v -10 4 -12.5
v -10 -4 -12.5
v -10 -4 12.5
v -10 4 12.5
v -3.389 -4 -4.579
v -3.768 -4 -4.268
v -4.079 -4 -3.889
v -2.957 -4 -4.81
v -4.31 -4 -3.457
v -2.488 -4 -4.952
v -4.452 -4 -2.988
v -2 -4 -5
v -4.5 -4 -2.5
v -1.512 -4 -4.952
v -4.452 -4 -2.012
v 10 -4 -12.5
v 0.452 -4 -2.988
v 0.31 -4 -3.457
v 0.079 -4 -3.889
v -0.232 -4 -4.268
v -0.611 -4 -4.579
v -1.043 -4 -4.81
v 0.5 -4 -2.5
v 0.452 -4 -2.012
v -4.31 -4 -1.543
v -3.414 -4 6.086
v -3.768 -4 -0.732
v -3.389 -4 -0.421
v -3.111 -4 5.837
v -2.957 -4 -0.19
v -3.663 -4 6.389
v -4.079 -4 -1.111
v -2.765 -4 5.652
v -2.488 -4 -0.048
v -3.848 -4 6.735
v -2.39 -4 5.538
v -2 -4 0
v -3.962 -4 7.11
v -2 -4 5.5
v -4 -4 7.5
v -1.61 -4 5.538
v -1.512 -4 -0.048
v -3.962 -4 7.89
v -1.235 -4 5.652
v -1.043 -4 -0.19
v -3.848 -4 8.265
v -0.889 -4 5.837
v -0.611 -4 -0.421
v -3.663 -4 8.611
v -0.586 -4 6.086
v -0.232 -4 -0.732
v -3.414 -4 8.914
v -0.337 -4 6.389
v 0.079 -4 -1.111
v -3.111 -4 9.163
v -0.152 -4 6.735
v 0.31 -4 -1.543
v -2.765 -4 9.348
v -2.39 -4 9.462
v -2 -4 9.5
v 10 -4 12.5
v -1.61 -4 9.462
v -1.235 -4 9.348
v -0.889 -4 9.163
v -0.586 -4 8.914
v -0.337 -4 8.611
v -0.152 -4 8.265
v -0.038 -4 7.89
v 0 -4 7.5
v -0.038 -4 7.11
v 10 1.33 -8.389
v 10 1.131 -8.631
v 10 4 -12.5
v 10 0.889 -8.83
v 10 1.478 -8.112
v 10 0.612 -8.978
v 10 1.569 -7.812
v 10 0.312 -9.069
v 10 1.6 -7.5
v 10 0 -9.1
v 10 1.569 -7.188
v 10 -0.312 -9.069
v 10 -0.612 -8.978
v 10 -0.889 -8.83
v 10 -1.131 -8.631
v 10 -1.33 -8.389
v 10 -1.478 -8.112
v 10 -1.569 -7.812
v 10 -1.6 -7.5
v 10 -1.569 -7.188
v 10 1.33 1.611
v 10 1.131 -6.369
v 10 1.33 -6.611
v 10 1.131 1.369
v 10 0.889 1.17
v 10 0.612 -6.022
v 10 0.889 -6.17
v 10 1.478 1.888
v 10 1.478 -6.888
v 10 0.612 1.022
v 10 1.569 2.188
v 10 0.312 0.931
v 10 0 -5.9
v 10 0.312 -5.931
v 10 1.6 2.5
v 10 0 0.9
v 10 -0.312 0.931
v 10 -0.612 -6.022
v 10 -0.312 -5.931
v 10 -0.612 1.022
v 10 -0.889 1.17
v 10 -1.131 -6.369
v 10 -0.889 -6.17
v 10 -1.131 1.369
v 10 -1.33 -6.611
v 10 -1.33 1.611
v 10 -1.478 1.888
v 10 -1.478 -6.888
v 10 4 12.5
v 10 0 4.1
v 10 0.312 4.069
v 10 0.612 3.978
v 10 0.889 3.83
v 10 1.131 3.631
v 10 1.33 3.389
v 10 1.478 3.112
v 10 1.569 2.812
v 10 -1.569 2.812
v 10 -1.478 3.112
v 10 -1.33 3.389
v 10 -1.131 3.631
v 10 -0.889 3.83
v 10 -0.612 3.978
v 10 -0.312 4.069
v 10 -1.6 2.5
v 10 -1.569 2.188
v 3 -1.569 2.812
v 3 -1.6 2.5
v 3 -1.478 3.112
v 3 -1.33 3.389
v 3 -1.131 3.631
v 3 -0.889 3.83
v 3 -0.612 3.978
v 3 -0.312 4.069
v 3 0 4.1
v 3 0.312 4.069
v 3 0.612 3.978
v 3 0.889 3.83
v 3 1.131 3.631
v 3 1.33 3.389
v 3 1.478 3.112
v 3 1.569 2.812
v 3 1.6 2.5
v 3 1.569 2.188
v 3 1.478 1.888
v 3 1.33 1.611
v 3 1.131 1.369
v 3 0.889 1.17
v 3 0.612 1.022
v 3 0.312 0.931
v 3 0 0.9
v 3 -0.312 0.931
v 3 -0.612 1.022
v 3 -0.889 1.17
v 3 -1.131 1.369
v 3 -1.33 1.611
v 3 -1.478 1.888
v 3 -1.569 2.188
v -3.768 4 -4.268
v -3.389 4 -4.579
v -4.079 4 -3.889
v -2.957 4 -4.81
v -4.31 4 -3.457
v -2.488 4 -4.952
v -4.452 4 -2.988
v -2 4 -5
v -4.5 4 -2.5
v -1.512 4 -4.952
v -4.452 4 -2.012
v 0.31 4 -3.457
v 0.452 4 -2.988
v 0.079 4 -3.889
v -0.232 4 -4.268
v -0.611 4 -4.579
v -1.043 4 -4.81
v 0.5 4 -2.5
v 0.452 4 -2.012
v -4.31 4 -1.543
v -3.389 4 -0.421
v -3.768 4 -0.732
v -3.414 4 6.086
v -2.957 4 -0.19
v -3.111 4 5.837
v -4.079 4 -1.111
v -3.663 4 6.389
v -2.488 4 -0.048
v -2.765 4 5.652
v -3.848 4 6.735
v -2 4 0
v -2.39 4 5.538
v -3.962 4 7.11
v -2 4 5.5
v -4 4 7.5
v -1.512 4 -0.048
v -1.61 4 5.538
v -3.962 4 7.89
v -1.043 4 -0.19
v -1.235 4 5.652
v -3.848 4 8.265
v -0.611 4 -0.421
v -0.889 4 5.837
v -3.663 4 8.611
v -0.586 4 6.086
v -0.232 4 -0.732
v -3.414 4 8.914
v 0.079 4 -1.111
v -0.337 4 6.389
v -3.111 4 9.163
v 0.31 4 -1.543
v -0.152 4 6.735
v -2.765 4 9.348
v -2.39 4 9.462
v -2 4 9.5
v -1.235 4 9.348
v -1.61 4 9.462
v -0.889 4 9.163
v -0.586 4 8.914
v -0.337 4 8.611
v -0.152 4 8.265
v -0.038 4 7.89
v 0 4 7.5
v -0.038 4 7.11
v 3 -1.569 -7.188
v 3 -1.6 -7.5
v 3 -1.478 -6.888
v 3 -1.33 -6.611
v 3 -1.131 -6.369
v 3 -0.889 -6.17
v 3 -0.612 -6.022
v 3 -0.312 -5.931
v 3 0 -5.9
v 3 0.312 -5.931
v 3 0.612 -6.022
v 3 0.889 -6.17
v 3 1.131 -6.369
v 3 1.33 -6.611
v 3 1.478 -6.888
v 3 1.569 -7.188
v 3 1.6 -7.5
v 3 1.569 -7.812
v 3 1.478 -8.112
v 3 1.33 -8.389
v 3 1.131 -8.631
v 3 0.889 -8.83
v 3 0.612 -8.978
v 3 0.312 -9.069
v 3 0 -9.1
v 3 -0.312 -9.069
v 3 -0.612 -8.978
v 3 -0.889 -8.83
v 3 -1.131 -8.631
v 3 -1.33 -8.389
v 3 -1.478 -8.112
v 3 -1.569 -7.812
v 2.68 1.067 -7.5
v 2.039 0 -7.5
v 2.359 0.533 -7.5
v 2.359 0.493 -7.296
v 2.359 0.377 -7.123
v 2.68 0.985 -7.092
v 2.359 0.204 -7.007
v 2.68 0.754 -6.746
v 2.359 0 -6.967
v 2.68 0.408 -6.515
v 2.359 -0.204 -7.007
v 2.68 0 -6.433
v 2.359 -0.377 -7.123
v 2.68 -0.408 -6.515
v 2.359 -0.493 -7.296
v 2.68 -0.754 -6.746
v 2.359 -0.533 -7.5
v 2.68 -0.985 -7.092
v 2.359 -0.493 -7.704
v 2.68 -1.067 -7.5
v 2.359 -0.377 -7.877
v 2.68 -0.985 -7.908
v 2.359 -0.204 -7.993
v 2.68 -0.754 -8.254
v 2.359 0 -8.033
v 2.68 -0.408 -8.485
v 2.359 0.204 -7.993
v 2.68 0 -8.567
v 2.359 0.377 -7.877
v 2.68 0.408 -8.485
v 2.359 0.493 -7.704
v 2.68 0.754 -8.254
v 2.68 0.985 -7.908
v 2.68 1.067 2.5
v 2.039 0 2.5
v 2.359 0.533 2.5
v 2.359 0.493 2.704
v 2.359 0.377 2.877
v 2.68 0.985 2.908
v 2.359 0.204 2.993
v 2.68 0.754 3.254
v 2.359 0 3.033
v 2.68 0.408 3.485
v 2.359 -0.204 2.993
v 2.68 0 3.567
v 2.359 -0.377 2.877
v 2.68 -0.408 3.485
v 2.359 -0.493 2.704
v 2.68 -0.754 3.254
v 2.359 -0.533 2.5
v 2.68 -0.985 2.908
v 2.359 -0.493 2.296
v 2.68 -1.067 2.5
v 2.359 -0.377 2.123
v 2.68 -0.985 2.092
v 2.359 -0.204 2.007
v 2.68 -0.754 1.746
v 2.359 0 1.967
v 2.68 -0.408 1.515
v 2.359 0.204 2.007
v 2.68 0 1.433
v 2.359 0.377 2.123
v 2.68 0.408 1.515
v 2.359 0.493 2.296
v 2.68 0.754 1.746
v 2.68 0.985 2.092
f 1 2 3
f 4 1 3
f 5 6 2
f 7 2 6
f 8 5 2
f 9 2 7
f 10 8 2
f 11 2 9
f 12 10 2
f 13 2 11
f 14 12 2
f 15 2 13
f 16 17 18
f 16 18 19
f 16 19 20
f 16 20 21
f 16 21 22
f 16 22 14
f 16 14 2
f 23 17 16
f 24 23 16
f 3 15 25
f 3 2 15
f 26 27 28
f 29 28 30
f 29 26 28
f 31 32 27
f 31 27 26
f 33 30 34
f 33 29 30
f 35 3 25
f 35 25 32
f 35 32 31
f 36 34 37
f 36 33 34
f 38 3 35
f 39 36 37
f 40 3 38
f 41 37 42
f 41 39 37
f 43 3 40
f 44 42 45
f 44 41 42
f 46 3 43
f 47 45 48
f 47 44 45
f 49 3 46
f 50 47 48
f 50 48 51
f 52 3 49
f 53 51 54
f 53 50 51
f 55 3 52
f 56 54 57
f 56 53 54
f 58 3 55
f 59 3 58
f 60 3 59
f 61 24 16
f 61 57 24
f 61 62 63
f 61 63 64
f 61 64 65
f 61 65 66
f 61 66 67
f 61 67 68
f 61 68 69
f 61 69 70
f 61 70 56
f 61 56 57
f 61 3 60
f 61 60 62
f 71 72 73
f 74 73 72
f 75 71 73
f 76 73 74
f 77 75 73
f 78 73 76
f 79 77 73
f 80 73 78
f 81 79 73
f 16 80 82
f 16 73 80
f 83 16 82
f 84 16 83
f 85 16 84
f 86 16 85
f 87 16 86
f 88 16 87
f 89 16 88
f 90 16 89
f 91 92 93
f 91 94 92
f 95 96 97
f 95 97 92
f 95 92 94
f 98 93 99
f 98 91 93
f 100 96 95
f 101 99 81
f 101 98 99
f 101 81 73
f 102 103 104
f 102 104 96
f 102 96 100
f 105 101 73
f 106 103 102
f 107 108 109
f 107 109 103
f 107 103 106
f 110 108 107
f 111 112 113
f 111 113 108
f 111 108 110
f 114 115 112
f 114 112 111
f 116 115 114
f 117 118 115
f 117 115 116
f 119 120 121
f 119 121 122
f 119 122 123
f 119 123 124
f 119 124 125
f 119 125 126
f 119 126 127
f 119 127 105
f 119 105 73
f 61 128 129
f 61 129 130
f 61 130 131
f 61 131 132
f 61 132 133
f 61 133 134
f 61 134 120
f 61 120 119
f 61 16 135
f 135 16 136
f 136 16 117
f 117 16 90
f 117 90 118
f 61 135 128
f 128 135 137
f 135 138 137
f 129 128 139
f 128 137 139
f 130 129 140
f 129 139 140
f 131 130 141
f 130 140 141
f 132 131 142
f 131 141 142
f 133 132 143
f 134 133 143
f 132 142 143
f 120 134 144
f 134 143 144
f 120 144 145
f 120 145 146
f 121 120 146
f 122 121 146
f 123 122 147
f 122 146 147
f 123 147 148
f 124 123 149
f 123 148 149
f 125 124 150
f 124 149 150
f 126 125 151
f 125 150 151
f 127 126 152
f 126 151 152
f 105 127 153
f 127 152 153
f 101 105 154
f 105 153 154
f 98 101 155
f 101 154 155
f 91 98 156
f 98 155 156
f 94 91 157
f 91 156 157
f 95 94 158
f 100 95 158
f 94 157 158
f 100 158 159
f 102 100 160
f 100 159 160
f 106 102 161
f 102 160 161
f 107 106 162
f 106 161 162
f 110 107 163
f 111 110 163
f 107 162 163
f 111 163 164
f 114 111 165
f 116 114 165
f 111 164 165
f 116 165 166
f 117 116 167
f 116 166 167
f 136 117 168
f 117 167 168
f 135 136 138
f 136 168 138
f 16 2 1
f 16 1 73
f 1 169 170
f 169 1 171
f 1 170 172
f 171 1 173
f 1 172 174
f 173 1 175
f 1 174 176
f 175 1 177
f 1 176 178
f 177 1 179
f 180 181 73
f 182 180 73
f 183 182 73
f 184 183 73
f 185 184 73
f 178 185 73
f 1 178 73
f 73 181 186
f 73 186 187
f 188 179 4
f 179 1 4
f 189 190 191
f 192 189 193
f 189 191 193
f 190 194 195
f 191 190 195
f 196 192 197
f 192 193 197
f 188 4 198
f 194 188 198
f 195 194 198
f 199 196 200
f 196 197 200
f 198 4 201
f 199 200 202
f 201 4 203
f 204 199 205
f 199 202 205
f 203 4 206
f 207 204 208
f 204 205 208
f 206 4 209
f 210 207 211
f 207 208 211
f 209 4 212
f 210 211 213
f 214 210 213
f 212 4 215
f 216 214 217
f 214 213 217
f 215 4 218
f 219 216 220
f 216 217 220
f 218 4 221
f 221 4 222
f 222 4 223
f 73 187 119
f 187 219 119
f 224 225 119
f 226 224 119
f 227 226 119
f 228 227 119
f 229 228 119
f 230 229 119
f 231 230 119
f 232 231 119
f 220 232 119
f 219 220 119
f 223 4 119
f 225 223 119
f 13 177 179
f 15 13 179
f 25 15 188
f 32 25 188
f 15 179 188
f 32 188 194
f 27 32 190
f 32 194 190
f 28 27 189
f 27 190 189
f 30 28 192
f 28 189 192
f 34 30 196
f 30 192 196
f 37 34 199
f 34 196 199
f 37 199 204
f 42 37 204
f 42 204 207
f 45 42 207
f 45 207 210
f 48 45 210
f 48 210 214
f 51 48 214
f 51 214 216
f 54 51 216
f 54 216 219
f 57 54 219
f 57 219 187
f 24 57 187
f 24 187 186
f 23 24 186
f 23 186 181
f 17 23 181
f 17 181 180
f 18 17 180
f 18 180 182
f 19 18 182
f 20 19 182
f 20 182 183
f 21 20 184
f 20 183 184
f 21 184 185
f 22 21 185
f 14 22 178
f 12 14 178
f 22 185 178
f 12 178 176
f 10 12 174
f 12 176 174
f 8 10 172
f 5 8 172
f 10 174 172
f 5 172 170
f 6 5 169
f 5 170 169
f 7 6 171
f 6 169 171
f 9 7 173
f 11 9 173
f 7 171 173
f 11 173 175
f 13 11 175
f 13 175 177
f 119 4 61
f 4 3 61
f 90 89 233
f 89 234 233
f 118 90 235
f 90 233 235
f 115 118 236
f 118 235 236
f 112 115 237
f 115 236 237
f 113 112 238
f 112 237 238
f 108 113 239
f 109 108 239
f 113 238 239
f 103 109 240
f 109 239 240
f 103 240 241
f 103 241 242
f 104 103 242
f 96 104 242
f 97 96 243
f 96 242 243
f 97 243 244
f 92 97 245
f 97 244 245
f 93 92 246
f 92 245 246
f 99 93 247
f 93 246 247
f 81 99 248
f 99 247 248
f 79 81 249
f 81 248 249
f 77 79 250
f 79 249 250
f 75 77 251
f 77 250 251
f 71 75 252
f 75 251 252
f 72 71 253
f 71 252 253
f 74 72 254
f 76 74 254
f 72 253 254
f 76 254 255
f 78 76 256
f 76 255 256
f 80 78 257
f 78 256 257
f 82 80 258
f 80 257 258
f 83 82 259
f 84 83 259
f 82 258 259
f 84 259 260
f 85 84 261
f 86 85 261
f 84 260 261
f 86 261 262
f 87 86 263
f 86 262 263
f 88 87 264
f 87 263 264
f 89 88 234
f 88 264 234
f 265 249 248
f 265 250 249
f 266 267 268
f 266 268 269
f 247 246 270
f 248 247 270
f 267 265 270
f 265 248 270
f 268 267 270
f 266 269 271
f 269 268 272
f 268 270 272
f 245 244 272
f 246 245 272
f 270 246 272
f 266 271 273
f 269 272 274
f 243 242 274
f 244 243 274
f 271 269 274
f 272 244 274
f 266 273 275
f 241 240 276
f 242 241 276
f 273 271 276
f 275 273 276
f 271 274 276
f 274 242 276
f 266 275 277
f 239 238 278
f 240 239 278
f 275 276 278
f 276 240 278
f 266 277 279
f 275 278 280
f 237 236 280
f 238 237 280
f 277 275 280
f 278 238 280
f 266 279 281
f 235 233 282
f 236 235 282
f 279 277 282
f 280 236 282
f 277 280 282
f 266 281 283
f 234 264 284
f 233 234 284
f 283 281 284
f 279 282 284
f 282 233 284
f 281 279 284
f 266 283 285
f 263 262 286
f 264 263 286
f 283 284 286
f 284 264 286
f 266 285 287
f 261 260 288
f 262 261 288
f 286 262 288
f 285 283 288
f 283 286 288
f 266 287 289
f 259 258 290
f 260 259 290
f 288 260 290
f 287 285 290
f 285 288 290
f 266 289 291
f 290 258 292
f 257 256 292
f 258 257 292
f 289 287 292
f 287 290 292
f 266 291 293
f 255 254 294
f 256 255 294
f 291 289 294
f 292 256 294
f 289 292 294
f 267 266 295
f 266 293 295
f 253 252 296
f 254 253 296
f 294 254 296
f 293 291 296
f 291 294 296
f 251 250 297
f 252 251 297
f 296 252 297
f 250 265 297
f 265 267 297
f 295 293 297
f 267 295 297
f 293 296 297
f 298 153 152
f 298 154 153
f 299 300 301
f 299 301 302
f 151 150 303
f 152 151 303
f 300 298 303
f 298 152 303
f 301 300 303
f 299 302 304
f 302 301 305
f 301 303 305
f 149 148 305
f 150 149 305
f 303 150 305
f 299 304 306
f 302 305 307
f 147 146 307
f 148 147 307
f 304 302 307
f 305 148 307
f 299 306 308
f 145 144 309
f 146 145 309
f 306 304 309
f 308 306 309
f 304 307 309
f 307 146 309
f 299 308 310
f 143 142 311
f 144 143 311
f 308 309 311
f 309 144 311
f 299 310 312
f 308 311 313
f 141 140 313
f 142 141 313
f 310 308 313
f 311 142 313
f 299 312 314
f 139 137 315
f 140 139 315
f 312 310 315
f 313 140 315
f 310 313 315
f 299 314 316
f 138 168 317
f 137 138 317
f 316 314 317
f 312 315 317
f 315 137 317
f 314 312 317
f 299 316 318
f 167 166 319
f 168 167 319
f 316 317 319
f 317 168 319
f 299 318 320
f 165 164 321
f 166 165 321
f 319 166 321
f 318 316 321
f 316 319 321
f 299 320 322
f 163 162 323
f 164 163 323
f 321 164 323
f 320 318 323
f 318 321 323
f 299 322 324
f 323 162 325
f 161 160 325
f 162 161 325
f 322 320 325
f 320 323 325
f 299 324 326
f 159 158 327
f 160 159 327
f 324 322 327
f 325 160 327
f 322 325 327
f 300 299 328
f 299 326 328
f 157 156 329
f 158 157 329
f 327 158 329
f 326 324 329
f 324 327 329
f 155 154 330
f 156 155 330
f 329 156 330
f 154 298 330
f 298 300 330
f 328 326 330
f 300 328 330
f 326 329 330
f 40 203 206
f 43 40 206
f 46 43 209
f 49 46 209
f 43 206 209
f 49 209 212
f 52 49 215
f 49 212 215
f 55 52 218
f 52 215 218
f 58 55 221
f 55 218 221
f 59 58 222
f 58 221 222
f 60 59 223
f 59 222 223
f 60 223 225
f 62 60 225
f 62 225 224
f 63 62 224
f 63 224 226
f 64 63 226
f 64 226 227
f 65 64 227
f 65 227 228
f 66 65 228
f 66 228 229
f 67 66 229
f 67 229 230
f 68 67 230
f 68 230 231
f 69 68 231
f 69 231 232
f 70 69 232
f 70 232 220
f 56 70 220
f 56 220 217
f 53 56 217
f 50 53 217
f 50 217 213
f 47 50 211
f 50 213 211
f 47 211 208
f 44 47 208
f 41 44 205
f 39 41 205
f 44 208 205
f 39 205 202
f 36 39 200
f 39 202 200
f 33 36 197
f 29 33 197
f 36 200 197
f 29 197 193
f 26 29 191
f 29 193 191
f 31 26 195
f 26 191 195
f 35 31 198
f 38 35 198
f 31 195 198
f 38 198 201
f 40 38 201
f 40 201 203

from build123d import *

# Parameters (mm, degrees)
F0_W     = 20
F0_H     = 25
F1_DEPTH = 4
F3_D     = 4
F4_D     = 5
F6_D     = 3.2
F6_DEPTH = 7
F6_TIP   = 0.9613769904


with BuildPart() as f1:
    # F0 (on Front) → F1 (new body, symmetric)
    with BuildSketch(Plane.XZ):
        Rectangle(F0_W, F0_H)
    extrude(amount=F1_DEPTH, both=True)

    # F3 (through all)
    with Locations(Plane.XZ.offset(4)):
        with Locations((-2, 7.5)):
            Hole(F3_D / 2)

    # F4 (through all)
    with Locations(Plane.XZ.offset(4)):
        with Locations((-2, -2.5)):
            Hole(F4_D / 2)

    # F6
    with Locations(Plane.YZ.offset(10)):
        with Locations((0, 2.5), (0, -7.5)):
            Hole(F6_D / 2, depth=F6_DEPTH)
            with Locations((0, 0, -(F6_DEPTH + F6_TIP / 2))):  # 118° drill point
                Cone(0, F6_D / 2, F6_TIP, mode=Mode.SUBTRACT)


solid = f1.part
